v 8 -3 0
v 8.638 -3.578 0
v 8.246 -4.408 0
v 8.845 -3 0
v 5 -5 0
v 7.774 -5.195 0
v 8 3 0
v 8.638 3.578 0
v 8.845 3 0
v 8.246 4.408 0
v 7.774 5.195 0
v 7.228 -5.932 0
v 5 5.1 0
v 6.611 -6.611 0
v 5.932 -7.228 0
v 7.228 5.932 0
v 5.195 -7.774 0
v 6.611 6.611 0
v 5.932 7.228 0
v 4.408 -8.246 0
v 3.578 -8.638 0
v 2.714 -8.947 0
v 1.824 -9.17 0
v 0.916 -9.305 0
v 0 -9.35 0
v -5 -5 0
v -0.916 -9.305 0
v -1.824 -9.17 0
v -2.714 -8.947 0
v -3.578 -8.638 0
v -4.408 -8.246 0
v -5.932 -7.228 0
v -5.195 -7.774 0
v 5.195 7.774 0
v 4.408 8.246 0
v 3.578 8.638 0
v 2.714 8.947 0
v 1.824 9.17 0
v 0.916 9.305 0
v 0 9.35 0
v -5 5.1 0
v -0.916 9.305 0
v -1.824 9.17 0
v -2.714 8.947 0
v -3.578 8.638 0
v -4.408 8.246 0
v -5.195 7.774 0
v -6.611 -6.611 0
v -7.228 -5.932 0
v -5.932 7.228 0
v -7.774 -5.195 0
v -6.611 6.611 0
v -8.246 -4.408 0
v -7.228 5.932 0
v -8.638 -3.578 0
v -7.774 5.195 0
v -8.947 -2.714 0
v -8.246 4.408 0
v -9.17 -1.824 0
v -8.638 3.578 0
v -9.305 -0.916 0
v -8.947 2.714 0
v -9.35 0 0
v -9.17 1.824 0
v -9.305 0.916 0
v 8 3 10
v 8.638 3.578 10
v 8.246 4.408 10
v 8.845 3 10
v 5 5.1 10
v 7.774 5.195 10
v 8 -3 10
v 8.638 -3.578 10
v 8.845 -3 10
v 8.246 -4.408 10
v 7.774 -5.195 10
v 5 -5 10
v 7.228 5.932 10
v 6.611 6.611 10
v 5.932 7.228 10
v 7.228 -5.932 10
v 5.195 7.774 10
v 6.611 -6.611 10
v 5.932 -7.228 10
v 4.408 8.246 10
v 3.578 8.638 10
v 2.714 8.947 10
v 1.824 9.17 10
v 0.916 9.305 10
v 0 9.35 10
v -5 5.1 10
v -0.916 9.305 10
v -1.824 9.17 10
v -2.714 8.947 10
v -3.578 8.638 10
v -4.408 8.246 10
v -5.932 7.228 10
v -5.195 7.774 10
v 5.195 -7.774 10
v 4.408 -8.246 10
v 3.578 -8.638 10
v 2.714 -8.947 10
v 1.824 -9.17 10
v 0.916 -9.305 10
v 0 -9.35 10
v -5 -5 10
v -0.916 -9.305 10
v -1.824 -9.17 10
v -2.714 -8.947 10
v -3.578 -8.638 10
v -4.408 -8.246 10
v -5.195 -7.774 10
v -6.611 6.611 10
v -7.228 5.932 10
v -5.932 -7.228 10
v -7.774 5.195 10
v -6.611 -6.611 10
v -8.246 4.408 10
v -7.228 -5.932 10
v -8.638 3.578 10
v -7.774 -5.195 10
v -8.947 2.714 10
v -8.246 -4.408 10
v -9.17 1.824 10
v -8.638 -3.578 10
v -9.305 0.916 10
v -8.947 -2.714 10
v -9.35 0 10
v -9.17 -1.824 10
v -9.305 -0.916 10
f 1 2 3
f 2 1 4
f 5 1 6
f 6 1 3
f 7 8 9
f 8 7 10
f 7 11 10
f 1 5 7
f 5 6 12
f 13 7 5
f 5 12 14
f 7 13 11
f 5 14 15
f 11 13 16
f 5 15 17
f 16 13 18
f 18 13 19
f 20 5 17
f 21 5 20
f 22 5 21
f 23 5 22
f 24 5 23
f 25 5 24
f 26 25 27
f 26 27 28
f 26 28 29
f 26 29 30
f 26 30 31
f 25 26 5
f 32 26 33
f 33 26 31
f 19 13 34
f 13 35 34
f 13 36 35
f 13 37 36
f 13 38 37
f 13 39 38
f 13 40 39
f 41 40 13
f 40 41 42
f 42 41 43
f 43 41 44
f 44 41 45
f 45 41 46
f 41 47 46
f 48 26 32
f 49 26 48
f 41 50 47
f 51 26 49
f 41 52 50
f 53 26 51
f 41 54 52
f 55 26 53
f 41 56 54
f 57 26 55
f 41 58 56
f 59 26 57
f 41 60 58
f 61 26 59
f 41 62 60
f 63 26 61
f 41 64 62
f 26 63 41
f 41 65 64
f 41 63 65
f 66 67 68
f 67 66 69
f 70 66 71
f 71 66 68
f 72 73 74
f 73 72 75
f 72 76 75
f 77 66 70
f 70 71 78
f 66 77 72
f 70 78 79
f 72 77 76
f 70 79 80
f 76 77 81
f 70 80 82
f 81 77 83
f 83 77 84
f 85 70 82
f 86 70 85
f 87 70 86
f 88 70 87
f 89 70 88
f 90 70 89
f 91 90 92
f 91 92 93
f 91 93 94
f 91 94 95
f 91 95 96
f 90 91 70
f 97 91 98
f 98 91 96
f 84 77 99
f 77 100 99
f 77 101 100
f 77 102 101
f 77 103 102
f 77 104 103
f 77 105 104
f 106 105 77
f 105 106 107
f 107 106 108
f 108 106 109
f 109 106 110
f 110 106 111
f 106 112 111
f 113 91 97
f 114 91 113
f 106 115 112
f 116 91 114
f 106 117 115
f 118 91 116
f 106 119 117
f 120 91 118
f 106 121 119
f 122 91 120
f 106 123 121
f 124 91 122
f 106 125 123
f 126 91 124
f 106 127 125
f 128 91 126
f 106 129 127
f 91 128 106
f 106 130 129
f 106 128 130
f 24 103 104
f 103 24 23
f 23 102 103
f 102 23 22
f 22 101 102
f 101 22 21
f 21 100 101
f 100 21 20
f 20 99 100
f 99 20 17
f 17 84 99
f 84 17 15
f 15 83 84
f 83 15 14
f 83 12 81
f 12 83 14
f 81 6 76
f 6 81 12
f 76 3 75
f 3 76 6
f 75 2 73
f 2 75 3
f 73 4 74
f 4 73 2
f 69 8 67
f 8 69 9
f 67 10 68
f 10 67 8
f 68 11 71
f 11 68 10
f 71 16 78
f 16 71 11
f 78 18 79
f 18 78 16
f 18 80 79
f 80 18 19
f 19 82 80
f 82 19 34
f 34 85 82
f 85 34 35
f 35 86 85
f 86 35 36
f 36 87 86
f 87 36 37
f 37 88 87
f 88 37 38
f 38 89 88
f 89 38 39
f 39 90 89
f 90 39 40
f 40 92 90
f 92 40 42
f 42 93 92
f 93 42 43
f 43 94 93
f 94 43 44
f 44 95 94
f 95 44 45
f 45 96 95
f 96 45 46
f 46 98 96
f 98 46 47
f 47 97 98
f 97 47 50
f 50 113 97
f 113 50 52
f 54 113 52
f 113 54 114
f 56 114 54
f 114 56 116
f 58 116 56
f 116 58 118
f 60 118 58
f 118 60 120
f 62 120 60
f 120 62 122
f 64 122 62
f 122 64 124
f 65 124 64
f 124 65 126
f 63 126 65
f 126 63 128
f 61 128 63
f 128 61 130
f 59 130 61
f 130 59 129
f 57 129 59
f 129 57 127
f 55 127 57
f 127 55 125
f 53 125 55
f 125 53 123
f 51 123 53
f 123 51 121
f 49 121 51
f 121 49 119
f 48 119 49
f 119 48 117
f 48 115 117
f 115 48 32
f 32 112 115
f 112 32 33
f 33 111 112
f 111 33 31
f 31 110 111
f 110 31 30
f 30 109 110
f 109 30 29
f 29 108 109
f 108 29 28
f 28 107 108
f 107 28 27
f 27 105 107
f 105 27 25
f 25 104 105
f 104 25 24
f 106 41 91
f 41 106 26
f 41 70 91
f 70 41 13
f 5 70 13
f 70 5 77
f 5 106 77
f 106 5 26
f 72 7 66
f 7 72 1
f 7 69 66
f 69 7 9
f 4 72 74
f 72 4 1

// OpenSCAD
// Snap-on clip for lab stand rod and tubing.
// Printed flat: 10 mm tall extrusion of a 2-D profile in the XY plane.

$fn = 64;

// Dimensions
rod_id   = 12.7;   // Rod inner diameter
rod_wall = 3;      // Rod ring wall thickness
rod_od   = rod_id + 2 * rod_wall; // Rod outer diameter (18.7)
tube_id  = 6;      // Tubing inner diameter
tube_wall = 2;     // Tubing wall thickness
tube_od  = tube_id + 2 * tube_wall; // Tubing outer diameter (10)
bridge_w = 6;      // Bridge width (Y)
bridge_x1 = 8;     // Bridge start X
bridge_x2 = 12;    // Bridge end X
tube_x   = 15;     // Tubing ring center X
clip_h   = 10;     // Extrusion height (Z)

// Rod ring opening
rod_open_w = 10;   // Opening width
rod_open_y = 5;    // Opening half-height (y from -5 to 5)

// Tubing ring opening
tube_open_w = 4.5; // Opening width
tube_open_y = 2.25; // Opening half-height (y from -2.25 to 2.25)

// Build the 2D profile in the XY plane, then extrude.
difference() {
    // 1. Rod Ring (Outer)
    // Centered at origin. Outer diameter 18.7.
    // We create a full circle and cut the opening.
    translate([0, 0, 0])
    linear_extrude(height = clip_h)
    difference() {
        circle(d = rod_od);
        // Cut opening: x < 0 and -5 < y < 5
        // We use a rectangle that extends slightly past the boundaries to ensure clean cut.
        translate([-rod_open_w / 2, -rod_open_y, 0])
        square([rod_open_w, rod_open_y * 2 + 0.1]);
    }

    // 2. Tubing Ring (Outer)
    // Centered at x = 15, y = 0. Outer diameter 10.
    translate([tube_x, 0, 0])
    linear_extrude(height = clip_h)
    difference() {
        circle(d = tube_od);
        // Cut opening: x > 15 and -2.25 < y < 2.25
        // Rectangle starts at x = 15, extends right.
        translate([tube_x, -tube_open_y, 0])
        square([tube_open_w + 0.1, tube_open_y * 2 + 0.1]);
    }

    // 3. Tubing Ring (Inner Hole)
    // Centered at x = 15, y = 0. Inner diameter 6.
    translate([tube_x, 0, 0])
    linear_extrude(height = clip_h)
    cylinder(h = clip_h + 0.1, d = tube_id);

    // 4. Rod Ring (Inner Hole)
    // Centered at origin. Inner diameter 12.7.
    linear_extrude(height = clip_h)
    cylinder(h = clip_h + 0.1, d = rod_id);

    // 5. Solid Bridge
    // Joins x=8 to x=12, width 6mm in Y.
    // It must not block the rod hole (y range approx -6.35 to 6.35) or tube hole (y range approx -3 to 3).
    // The bridge is placed at y=0 with width 6, so it spans y=-3 to y=3.
    // This is safe as it is inside the rod hole and inside the tube hole.
    translate([bridge_x1, -bridge_w / 2, 0])
    linear_extrude(height = clip_h)
    square([bridge_x2 - bridge_x1, bridge_w]);
}
